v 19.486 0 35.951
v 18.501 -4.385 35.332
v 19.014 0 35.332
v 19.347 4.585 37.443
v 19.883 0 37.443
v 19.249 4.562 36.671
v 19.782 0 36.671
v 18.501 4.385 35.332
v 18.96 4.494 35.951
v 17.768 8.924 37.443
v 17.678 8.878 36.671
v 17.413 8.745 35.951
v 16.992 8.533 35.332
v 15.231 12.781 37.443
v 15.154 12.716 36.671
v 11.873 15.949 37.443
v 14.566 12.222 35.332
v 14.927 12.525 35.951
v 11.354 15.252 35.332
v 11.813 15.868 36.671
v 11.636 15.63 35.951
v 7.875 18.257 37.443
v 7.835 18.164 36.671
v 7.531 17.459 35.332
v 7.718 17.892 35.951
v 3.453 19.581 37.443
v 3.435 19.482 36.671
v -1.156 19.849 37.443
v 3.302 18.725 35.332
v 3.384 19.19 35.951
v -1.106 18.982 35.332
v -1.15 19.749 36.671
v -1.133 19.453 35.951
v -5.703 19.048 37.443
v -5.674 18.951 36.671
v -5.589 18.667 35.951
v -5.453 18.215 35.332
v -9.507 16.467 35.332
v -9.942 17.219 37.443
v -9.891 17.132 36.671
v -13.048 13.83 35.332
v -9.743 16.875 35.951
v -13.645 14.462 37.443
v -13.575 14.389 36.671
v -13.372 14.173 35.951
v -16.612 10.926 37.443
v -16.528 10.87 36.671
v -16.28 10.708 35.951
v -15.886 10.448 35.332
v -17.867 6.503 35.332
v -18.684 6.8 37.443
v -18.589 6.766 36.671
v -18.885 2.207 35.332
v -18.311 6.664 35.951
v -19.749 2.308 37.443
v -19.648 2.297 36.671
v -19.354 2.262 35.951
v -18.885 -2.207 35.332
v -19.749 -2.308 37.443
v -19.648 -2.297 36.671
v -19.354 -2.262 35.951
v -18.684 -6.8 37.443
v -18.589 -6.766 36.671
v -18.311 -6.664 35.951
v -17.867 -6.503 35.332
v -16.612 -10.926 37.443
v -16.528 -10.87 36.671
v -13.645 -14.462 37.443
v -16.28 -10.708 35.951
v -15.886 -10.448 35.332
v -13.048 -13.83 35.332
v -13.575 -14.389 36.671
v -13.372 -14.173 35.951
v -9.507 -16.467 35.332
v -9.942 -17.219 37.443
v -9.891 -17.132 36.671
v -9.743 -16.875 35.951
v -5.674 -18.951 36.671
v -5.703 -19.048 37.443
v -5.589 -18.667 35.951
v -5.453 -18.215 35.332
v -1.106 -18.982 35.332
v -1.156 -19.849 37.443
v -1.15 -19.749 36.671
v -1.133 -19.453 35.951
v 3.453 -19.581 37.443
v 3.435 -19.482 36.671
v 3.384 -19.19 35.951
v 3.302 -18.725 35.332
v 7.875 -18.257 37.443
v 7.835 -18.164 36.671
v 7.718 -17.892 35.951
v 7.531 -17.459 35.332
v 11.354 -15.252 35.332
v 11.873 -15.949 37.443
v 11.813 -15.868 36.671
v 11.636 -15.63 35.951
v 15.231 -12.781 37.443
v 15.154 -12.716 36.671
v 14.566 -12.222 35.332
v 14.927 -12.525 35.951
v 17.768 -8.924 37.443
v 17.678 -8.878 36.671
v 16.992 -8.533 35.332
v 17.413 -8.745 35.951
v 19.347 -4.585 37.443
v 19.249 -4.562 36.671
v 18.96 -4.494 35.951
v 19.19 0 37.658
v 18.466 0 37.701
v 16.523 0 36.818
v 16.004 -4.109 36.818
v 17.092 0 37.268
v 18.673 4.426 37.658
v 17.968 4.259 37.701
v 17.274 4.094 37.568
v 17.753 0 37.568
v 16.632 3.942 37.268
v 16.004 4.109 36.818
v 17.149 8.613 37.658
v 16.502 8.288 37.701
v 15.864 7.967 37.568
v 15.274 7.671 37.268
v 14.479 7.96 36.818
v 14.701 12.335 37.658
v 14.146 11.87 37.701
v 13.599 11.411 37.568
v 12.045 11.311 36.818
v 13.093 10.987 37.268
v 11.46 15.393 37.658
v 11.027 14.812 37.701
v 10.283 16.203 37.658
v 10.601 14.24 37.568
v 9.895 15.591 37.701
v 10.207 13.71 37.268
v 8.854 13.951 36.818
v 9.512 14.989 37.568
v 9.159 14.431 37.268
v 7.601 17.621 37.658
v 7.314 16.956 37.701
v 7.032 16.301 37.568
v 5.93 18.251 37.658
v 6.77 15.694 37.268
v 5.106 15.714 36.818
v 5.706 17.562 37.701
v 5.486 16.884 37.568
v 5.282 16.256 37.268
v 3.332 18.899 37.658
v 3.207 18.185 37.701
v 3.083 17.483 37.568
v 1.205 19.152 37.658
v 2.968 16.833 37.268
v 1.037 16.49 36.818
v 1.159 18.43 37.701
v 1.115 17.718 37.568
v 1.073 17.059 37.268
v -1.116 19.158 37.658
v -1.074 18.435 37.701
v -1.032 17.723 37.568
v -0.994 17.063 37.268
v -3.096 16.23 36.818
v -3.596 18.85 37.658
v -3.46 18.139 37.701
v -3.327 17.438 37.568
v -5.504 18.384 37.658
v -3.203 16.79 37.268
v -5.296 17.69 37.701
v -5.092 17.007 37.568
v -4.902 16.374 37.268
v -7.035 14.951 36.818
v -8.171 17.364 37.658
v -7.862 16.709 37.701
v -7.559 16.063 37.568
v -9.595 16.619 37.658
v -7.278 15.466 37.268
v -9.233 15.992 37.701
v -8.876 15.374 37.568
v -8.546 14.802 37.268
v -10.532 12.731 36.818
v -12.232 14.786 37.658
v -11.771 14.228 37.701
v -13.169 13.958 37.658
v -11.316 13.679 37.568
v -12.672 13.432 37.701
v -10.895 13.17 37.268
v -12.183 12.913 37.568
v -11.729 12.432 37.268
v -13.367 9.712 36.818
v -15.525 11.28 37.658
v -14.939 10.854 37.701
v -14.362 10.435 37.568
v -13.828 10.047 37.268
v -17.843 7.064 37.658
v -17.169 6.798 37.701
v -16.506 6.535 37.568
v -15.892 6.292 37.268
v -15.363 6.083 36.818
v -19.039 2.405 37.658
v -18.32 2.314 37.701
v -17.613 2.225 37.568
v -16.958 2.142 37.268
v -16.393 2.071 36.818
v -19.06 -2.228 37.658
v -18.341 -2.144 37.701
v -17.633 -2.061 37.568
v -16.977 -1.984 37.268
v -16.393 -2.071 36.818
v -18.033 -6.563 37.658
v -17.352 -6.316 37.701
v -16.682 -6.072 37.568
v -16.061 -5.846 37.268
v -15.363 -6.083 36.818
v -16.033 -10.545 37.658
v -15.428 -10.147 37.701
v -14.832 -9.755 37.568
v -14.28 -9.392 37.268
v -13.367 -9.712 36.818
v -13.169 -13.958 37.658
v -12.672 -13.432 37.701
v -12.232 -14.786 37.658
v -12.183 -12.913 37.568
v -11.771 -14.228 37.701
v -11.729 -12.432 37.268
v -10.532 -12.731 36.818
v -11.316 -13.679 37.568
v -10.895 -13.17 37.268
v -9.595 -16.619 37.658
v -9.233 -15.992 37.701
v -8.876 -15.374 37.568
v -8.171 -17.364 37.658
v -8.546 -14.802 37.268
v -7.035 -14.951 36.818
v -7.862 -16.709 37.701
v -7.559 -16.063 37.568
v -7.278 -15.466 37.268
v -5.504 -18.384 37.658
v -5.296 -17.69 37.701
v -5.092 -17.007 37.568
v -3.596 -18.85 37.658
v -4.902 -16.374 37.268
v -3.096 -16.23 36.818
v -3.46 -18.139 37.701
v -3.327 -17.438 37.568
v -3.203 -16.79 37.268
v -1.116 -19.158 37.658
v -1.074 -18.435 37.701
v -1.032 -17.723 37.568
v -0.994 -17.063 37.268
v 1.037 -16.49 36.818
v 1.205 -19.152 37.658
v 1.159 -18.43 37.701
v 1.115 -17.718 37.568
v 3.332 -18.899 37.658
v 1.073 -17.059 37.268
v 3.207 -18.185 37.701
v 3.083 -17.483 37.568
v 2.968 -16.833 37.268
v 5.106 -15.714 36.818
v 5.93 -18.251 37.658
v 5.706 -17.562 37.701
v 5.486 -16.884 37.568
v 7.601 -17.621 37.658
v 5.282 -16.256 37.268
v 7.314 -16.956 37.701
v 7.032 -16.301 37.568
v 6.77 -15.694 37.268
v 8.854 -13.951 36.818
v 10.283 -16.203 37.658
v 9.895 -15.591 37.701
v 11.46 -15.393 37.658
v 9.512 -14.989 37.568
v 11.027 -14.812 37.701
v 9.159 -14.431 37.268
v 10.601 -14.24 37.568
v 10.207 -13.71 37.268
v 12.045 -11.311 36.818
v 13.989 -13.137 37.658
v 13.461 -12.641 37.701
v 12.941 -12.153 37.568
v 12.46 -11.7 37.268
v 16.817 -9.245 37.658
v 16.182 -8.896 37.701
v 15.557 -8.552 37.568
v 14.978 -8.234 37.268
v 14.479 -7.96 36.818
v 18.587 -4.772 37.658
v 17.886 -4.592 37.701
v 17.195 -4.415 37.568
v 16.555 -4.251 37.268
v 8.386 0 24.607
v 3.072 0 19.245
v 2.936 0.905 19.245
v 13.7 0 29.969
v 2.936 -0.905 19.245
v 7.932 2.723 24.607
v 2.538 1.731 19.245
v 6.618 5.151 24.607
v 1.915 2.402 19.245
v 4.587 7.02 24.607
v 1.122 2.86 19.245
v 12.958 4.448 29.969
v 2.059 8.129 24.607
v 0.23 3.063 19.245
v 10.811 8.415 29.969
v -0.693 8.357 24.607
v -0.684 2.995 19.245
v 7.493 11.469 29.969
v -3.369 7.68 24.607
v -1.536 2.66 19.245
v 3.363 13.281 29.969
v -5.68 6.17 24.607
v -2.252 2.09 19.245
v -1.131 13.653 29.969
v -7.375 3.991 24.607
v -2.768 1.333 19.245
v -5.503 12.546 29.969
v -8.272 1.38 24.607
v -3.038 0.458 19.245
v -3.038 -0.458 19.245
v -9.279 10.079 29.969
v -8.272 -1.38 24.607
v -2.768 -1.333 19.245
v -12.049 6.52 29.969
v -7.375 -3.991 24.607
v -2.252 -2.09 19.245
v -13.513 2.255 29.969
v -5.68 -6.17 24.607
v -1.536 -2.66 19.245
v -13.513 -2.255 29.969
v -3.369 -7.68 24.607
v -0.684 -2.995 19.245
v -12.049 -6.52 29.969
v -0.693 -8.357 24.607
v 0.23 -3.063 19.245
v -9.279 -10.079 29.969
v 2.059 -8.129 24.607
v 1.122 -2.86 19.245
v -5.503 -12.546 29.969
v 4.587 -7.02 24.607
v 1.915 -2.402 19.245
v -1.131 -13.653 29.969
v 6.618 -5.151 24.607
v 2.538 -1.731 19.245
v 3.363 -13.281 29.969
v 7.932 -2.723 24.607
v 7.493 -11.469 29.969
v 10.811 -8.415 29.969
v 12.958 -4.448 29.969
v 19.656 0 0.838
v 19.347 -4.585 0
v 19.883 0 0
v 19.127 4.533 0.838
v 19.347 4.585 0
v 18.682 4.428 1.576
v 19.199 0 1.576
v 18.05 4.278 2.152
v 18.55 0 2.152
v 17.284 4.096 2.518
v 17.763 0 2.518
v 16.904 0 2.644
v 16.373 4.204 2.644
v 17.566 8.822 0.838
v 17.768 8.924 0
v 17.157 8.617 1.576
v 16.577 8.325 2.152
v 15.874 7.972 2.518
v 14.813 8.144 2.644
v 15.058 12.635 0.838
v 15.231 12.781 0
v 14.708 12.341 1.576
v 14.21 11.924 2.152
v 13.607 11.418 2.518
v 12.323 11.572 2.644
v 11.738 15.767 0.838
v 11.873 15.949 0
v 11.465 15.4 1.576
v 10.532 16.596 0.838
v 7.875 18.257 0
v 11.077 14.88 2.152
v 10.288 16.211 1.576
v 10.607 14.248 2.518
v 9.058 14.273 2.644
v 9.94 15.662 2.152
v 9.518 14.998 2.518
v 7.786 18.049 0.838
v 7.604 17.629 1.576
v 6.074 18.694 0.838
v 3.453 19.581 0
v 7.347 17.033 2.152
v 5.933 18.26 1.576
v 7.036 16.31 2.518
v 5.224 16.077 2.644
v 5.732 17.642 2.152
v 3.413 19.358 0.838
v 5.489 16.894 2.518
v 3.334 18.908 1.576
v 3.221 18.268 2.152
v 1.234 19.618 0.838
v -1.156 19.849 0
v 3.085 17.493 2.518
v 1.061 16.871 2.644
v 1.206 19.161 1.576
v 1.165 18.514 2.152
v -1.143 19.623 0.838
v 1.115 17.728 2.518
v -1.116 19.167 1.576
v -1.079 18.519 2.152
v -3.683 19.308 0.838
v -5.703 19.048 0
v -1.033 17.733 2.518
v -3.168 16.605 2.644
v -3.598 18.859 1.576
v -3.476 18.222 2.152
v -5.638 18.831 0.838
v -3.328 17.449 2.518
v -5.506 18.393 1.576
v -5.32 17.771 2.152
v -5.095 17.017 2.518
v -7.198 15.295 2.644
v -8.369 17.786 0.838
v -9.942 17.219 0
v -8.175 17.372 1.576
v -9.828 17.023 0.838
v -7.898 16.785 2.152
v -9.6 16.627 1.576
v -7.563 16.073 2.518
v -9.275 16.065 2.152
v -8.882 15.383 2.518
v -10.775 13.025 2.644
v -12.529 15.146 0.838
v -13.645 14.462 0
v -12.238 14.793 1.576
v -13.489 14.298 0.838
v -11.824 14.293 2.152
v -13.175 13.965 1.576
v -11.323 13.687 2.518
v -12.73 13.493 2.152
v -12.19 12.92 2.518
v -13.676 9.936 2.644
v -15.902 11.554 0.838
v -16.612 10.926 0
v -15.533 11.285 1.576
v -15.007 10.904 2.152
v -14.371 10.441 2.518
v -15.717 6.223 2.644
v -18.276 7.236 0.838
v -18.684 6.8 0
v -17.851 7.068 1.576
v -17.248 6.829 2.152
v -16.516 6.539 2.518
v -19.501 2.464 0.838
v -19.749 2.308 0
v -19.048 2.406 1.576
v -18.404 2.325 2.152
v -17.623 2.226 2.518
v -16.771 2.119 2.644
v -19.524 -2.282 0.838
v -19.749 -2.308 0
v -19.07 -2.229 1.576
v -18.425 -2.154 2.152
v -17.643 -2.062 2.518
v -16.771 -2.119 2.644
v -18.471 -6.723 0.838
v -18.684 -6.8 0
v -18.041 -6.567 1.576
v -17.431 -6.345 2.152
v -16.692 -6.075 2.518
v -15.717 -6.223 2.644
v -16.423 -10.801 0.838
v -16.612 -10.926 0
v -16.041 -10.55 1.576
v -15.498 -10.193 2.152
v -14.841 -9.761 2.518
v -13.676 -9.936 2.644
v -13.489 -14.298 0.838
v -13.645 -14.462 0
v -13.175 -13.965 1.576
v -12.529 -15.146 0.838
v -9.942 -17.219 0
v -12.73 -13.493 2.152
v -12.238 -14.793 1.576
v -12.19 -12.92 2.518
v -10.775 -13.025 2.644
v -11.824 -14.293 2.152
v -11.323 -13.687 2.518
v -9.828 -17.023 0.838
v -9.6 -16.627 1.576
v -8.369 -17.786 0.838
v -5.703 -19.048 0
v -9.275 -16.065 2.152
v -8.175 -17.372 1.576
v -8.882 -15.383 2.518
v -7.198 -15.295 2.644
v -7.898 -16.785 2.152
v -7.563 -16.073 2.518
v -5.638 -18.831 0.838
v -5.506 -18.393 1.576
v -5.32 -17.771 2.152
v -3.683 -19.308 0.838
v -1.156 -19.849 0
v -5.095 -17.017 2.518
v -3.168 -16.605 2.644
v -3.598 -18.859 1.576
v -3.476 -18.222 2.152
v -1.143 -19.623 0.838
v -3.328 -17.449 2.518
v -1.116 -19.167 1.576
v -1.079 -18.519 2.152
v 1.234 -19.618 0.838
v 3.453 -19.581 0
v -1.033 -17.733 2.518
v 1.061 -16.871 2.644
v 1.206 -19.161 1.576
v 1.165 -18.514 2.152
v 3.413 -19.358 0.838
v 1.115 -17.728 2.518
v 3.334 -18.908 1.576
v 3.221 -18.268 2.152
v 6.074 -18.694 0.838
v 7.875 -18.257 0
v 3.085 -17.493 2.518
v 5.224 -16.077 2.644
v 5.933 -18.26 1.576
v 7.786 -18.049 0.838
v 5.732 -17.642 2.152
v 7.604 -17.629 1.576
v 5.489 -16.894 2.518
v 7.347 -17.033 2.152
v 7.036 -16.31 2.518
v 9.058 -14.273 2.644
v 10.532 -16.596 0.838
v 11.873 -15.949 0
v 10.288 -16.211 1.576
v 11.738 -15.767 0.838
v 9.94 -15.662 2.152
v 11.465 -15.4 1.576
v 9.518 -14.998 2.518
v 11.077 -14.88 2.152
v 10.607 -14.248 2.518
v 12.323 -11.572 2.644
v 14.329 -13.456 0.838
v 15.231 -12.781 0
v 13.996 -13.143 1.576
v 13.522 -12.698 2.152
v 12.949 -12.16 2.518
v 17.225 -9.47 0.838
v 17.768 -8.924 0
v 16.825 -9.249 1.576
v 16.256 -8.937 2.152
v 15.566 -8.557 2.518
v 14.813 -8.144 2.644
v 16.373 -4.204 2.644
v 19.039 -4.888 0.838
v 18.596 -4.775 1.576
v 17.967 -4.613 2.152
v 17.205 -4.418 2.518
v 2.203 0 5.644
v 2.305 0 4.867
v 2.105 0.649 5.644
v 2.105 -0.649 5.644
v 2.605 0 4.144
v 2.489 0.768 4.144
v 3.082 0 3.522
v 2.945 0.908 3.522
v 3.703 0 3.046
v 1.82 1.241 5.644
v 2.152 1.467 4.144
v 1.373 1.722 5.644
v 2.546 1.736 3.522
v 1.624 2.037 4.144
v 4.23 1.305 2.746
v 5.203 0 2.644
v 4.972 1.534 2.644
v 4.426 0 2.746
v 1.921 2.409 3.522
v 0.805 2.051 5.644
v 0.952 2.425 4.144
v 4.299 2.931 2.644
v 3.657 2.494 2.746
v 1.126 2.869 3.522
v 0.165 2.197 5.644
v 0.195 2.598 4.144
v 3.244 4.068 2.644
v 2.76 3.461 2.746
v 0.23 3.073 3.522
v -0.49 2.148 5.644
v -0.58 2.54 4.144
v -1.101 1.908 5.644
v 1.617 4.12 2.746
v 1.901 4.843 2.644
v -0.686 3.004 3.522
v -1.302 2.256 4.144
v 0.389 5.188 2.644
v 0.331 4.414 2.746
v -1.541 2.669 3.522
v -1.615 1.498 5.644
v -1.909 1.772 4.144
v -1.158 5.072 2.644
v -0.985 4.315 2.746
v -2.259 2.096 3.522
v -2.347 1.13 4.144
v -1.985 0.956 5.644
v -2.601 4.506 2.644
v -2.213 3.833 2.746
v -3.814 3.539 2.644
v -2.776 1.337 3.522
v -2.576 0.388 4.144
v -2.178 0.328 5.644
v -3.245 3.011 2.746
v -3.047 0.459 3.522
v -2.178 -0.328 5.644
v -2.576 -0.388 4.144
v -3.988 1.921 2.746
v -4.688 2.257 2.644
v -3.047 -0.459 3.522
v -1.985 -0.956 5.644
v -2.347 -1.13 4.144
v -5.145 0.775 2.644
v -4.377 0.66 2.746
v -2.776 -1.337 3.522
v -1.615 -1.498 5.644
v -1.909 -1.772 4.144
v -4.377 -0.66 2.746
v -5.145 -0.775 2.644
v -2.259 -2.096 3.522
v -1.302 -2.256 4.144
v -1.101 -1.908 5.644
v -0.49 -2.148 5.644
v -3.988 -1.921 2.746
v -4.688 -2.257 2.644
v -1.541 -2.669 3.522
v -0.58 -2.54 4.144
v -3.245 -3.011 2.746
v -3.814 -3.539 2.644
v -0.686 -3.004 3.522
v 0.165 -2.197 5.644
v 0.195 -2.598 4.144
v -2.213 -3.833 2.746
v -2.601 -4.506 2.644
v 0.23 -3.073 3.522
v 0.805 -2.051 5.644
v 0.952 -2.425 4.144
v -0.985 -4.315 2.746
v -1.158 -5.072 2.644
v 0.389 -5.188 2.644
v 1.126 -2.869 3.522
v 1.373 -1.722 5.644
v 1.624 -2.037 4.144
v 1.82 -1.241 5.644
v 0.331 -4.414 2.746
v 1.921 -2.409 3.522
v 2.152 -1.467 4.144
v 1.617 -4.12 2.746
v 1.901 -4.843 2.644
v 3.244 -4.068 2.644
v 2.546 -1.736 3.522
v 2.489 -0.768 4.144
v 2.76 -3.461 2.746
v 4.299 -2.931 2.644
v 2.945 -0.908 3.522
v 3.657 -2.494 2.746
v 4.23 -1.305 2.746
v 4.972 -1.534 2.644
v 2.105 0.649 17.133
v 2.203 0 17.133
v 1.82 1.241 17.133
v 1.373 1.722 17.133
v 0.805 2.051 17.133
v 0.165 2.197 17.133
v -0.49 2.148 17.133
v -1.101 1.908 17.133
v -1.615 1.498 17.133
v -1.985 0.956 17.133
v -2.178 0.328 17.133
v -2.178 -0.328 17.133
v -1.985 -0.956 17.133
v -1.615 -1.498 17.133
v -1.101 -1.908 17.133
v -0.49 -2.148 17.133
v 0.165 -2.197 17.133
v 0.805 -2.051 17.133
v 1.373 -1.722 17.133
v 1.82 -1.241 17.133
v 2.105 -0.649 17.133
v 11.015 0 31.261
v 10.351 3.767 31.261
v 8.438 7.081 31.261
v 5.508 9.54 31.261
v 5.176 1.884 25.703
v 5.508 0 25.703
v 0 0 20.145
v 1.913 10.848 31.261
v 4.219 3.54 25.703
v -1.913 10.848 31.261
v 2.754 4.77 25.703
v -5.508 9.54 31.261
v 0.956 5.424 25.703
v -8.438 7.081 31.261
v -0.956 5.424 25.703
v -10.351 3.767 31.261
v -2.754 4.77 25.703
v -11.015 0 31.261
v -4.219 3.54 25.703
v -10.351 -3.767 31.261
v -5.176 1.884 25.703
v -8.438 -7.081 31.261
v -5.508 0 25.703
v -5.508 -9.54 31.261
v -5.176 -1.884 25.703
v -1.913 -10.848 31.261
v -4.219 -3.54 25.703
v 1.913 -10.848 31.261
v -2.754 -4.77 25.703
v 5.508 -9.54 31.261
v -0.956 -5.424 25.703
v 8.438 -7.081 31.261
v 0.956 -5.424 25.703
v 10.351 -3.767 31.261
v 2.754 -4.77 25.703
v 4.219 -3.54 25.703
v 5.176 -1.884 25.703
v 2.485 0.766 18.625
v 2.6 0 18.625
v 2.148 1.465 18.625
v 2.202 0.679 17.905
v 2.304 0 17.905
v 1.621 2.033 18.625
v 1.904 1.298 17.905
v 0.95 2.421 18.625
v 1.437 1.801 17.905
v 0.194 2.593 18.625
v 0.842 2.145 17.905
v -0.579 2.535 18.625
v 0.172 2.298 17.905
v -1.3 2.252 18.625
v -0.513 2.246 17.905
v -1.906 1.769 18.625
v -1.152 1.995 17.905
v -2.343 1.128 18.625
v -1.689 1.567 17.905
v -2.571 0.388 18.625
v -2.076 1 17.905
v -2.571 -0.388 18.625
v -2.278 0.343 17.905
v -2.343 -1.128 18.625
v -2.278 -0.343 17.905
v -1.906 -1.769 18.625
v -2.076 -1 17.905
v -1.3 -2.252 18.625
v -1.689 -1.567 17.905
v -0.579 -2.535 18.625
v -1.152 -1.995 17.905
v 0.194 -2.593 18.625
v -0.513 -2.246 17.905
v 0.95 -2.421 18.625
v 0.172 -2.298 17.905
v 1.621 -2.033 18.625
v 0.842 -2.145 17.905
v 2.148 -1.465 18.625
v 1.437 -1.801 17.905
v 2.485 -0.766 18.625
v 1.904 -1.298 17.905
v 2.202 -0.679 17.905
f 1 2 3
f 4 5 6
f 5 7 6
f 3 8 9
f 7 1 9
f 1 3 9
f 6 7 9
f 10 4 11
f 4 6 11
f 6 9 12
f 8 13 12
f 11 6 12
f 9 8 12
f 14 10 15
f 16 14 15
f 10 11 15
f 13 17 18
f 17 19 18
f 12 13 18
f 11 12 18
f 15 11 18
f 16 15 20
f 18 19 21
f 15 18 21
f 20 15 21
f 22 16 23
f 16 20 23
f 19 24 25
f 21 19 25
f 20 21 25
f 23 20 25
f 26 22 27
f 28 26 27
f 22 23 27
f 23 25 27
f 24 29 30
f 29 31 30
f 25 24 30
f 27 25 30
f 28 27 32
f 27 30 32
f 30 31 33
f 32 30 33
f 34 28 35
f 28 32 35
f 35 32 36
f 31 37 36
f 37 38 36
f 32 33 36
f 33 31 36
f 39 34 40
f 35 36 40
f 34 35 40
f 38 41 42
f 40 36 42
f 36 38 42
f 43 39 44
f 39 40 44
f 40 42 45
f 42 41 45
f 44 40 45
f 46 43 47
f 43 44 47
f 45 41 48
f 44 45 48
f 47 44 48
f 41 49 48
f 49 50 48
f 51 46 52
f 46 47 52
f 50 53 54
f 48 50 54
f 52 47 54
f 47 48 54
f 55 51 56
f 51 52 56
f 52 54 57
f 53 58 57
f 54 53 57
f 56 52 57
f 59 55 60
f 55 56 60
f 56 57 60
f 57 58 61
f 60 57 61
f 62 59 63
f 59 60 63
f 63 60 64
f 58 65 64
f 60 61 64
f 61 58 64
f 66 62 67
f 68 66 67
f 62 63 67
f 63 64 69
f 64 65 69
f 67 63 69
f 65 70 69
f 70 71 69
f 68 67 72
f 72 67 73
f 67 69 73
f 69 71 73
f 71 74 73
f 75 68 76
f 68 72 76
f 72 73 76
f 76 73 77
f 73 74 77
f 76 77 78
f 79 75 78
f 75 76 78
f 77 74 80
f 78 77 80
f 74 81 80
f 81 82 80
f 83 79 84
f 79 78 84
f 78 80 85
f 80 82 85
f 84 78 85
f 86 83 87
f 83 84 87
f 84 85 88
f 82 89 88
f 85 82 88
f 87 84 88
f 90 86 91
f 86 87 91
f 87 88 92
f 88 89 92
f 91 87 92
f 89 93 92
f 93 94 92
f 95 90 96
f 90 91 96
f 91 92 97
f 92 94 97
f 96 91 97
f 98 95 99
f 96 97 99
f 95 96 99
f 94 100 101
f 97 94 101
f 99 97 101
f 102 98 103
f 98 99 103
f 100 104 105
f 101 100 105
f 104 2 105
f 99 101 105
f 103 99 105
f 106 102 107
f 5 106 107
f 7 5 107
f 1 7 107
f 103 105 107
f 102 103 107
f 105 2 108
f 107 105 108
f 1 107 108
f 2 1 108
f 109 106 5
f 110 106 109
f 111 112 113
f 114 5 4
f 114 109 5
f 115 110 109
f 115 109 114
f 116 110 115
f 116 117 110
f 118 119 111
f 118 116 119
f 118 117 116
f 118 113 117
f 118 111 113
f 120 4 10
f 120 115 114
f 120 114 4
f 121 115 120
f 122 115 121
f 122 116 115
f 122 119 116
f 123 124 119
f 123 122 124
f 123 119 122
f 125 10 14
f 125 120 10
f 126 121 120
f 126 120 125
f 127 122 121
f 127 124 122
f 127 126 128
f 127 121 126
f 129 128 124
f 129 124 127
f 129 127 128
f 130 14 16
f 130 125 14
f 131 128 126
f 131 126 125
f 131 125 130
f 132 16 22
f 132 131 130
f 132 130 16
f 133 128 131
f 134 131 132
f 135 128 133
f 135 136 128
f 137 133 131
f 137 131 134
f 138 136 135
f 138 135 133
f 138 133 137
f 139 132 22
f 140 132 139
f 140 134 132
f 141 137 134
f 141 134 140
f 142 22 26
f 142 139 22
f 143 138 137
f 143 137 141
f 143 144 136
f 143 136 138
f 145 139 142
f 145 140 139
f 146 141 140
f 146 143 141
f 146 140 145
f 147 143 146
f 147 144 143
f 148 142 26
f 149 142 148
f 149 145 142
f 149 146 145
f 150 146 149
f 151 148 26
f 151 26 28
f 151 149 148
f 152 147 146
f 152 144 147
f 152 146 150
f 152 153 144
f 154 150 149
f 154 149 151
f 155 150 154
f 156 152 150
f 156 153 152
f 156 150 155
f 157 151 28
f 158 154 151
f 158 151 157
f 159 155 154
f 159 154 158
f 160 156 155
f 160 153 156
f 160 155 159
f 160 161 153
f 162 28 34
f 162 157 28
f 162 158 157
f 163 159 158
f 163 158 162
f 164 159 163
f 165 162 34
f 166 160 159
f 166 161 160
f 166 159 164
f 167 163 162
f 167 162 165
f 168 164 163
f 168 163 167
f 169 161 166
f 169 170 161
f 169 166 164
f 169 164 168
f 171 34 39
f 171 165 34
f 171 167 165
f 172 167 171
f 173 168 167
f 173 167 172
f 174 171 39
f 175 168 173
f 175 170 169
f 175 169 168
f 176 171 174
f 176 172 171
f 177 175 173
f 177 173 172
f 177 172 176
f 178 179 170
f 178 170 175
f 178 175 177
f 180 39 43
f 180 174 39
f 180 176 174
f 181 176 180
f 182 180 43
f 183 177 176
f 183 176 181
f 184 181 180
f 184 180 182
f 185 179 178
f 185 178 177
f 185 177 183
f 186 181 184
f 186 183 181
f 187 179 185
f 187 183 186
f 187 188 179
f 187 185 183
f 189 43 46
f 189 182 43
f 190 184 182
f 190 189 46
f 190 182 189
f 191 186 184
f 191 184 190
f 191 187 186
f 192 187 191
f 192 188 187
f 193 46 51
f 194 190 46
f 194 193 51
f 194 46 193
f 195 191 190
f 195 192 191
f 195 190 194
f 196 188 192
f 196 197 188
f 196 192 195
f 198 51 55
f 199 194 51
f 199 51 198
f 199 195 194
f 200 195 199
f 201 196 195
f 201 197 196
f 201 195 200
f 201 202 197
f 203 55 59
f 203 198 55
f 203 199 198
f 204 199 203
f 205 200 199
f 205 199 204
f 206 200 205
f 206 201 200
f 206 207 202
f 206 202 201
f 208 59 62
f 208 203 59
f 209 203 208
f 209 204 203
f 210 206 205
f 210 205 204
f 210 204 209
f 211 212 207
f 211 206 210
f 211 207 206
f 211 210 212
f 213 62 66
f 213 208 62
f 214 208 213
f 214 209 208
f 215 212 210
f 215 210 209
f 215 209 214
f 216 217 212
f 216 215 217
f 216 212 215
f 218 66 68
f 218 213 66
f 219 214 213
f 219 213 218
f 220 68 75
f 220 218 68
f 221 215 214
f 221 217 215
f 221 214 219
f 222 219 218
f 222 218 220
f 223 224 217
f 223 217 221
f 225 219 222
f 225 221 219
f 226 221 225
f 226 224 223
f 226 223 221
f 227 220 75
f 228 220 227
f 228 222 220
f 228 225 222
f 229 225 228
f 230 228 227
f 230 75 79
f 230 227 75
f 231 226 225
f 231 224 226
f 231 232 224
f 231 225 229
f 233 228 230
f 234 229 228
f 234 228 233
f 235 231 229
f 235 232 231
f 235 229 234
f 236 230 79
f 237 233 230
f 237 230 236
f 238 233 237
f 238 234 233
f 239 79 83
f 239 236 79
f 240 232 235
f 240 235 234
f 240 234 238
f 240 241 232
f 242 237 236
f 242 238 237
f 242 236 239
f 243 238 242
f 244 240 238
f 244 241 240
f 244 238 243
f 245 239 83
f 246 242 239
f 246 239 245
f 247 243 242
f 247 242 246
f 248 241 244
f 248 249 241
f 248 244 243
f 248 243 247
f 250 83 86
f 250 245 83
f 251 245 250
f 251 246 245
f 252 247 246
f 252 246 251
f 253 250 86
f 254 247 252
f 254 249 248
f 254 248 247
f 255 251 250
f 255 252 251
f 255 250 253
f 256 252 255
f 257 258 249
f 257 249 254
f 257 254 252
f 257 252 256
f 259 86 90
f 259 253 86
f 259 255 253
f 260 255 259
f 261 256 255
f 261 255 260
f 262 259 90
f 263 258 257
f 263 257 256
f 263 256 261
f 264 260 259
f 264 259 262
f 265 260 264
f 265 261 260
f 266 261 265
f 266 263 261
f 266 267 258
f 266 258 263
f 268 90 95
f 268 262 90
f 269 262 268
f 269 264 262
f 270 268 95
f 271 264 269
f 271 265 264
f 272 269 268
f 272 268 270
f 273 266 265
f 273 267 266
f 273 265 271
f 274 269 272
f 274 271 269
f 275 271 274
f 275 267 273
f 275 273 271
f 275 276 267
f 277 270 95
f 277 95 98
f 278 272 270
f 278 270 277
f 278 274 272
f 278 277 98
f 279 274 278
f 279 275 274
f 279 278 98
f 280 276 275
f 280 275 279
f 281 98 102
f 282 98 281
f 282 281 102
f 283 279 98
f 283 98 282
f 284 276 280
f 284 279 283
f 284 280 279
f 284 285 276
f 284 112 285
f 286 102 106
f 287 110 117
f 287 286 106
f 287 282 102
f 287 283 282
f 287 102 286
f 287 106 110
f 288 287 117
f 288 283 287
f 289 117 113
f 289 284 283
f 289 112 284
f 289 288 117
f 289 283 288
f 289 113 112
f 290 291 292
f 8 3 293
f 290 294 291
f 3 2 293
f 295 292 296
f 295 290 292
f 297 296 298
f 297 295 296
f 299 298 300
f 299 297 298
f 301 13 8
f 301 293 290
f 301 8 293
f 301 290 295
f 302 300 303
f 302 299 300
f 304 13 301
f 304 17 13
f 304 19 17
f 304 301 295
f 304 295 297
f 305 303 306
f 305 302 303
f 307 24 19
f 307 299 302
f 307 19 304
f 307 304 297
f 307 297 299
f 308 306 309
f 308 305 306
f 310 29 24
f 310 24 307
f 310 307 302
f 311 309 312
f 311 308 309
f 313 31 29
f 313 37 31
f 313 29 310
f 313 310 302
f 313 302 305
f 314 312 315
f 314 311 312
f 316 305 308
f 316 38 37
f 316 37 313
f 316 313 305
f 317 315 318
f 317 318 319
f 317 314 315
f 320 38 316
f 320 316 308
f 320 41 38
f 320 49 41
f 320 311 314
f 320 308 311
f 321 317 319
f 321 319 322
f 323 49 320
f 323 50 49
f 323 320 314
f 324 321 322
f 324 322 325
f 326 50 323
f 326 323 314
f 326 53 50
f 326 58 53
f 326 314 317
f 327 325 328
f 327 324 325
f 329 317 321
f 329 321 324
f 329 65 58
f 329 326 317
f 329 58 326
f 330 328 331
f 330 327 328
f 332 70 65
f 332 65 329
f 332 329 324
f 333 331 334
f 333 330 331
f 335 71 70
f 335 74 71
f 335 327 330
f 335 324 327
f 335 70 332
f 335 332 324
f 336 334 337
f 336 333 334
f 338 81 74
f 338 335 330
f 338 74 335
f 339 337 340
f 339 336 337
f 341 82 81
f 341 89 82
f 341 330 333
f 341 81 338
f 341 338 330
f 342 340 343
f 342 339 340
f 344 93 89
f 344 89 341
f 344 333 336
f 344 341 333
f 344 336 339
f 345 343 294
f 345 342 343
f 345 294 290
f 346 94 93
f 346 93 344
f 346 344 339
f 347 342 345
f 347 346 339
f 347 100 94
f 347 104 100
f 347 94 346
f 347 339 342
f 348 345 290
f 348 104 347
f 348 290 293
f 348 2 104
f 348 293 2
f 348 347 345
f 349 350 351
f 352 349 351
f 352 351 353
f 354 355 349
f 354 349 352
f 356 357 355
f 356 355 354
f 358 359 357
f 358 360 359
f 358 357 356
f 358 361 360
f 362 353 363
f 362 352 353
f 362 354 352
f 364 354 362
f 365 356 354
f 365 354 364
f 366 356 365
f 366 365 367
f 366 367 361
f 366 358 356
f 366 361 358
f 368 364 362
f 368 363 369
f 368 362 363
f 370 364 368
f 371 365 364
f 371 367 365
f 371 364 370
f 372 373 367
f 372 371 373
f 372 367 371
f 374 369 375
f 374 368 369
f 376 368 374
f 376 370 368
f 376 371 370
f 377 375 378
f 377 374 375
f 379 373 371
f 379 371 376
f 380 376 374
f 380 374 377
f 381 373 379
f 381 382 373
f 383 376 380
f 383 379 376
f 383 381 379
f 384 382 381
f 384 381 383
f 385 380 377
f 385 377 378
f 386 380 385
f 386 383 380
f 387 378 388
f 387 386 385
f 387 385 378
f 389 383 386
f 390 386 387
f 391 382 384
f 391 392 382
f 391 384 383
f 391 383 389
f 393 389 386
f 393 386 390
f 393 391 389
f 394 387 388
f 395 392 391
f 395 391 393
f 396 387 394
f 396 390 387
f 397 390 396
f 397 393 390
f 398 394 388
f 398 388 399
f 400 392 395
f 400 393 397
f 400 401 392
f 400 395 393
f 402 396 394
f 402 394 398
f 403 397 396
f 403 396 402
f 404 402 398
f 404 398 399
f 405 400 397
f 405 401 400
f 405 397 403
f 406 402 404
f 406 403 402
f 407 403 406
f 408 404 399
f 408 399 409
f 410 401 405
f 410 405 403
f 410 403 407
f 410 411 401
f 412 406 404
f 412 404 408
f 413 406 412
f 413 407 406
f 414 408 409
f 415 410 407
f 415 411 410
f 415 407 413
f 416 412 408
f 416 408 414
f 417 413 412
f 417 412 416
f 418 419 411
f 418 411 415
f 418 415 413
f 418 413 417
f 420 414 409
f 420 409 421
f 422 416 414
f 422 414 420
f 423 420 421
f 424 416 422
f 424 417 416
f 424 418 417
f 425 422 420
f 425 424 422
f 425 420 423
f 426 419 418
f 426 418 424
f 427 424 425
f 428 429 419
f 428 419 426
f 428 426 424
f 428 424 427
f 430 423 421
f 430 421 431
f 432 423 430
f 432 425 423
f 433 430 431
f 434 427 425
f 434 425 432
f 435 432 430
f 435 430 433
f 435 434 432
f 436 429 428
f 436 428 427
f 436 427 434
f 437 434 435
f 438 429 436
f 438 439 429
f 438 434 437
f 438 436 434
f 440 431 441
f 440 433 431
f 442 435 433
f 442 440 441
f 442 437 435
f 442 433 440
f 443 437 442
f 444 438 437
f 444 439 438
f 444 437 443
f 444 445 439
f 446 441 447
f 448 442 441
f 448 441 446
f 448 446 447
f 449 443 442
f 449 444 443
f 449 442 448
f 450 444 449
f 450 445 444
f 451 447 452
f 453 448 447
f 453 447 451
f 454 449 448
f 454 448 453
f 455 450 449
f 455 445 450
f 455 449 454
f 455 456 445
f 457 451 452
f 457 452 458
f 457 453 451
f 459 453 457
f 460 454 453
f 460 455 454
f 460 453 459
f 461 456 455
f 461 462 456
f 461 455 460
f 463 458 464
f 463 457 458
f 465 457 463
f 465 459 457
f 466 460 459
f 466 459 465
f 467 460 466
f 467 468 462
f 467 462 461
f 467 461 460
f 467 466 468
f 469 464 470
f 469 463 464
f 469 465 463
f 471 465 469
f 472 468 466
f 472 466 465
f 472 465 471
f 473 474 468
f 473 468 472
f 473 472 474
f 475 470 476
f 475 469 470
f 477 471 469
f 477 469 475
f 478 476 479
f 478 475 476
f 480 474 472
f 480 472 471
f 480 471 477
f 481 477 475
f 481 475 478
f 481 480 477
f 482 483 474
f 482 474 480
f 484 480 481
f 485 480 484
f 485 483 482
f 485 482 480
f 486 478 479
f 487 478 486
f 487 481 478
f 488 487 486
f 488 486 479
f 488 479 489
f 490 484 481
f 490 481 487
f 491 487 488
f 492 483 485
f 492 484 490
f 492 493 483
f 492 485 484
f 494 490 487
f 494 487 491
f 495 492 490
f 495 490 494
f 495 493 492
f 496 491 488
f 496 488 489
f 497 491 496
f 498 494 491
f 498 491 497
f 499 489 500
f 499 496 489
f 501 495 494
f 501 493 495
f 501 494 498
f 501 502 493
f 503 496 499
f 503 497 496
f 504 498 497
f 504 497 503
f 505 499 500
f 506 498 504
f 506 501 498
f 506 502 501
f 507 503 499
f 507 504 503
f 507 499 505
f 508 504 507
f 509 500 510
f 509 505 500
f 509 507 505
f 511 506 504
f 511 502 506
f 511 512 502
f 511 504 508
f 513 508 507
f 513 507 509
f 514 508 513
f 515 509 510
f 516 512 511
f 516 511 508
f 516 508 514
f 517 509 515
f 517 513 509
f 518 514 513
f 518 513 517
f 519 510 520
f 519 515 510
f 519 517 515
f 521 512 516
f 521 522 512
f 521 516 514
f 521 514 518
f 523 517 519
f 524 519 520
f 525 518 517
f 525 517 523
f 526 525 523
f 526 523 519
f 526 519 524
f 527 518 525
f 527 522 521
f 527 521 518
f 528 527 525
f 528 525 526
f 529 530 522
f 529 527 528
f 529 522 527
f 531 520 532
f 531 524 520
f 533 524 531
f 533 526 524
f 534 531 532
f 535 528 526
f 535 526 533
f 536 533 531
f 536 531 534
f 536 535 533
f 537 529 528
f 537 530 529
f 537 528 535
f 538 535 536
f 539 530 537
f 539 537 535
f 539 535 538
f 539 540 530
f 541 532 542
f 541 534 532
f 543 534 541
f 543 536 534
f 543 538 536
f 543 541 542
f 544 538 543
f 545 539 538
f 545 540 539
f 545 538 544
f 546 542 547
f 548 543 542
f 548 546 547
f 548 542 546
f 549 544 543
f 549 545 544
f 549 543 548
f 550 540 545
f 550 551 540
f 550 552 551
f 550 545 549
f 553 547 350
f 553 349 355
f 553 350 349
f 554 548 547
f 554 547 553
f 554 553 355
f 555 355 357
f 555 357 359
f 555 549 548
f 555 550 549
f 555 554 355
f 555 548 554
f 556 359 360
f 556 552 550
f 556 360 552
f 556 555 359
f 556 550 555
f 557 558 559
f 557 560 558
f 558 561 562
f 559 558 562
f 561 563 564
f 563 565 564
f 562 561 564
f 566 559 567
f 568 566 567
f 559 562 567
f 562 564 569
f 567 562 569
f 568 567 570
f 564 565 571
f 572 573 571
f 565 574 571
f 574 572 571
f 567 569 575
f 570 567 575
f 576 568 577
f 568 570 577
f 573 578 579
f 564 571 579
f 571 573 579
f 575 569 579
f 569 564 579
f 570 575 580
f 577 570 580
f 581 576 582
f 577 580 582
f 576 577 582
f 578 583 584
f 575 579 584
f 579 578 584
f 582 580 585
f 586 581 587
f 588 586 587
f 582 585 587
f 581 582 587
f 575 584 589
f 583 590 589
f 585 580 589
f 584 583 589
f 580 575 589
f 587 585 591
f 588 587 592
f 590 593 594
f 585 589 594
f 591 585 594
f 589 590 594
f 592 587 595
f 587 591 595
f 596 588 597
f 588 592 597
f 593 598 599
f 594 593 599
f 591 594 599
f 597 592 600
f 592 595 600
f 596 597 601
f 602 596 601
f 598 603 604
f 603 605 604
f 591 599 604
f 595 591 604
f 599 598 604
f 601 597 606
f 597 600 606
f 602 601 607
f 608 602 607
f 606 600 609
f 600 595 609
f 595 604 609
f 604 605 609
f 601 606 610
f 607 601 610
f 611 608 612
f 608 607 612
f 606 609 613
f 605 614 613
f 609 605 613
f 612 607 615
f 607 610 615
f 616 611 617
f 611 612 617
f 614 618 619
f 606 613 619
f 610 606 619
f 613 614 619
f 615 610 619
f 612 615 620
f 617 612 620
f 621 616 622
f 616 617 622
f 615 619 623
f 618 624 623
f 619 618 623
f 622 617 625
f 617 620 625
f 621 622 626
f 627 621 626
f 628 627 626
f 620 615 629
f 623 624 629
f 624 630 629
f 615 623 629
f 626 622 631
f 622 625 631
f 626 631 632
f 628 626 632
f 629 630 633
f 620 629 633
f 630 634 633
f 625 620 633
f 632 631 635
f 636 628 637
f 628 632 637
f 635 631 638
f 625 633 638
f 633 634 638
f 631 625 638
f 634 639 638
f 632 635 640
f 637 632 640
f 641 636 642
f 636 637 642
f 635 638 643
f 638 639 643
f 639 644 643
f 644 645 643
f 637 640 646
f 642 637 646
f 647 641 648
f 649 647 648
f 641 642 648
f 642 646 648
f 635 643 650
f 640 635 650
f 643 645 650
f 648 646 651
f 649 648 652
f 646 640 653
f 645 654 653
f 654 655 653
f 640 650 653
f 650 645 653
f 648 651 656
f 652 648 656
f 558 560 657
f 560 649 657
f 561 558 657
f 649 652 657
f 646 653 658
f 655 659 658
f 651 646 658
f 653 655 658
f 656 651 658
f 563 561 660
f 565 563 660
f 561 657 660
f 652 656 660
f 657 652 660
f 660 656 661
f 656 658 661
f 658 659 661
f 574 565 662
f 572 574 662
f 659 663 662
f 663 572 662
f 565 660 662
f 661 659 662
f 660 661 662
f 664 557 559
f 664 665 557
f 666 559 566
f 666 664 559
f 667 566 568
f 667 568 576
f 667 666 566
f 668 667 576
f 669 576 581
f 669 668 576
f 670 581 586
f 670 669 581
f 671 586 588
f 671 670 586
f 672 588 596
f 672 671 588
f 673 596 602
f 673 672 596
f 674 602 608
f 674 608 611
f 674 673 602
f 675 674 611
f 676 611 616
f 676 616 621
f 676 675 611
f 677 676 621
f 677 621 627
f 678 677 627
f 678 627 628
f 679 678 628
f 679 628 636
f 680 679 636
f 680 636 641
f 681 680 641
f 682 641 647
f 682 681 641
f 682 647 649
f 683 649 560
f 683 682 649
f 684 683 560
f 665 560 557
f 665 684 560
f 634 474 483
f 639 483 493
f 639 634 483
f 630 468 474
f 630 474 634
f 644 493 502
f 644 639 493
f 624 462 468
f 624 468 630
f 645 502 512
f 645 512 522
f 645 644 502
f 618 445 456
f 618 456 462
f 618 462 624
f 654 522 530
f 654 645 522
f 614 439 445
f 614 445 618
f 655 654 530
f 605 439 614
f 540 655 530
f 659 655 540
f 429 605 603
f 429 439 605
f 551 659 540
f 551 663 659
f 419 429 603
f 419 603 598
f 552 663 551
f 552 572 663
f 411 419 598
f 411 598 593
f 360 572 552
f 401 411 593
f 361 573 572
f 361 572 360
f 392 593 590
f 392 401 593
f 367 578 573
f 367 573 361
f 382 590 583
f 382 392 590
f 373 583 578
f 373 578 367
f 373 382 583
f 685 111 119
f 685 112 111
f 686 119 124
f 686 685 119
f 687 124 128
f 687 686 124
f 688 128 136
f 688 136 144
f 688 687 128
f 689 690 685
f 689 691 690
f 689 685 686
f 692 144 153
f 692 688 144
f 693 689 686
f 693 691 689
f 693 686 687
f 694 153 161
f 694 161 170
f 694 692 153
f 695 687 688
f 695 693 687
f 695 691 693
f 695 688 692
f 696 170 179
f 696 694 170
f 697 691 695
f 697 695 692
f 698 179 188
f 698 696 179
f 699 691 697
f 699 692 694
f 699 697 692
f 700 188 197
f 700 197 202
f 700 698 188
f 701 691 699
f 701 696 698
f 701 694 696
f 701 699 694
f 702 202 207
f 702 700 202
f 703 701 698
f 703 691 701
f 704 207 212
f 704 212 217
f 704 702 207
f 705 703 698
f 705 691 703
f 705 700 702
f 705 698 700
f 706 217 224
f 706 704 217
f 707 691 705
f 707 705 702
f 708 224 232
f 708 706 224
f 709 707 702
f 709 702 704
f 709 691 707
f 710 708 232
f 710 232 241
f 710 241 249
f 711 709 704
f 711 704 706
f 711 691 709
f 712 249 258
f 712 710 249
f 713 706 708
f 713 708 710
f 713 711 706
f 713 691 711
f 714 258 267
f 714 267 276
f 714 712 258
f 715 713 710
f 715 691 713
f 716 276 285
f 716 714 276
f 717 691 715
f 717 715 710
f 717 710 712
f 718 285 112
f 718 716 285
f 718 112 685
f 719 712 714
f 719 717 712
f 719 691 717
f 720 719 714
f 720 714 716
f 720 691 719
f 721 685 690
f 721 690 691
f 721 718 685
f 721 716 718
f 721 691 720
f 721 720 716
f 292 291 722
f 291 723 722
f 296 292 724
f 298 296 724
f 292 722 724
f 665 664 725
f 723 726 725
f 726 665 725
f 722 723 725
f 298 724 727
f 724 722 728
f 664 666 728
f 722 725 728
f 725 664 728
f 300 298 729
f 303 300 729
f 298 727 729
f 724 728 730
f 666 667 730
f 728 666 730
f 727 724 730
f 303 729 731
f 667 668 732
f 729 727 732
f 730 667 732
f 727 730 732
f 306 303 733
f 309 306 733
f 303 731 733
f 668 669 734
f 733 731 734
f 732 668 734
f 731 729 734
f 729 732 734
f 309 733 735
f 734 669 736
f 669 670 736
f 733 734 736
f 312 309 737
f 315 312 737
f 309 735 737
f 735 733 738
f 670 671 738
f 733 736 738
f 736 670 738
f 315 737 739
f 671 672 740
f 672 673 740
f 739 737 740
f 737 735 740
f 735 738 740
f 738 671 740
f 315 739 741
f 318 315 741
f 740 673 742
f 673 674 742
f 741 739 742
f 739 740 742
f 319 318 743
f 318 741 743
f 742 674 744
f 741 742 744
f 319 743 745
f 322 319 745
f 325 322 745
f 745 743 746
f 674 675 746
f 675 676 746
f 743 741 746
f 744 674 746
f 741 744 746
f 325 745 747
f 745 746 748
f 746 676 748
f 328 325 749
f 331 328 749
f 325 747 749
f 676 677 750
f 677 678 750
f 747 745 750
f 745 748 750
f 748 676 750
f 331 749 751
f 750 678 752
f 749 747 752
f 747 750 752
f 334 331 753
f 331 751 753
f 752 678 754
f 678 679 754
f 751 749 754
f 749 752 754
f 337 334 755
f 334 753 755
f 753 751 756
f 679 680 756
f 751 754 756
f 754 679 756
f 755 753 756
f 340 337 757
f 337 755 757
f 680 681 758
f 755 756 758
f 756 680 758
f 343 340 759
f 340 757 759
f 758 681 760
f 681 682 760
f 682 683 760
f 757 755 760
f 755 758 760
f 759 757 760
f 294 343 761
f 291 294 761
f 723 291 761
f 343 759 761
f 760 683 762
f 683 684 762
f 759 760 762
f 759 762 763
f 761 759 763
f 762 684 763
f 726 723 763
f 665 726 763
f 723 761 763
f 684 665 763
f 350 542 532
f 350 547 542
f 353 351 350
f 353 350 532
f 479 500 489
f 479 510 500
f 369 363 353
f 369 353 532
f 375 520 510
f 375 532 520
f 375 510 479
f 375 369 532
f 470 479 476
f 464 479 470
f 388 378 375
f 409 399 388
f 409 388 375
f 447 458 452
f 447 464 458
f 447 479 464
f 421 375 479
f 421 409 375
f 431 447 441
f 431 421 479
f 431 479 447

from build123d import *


# Not quite as in the source:
# - a fillet or chamfer that OpenCascade refuses, or shapes differently, is made with other operations: its cross-section is extruded or revolved along the edge and cut away or added


with BuildPart() as f1:
    # F0 (on Front) → F1 (revolve)
    with BuildSketch(Plane.XZ):
        Polygon((0, 20.1451450631), (0, 16.144845517), (2.2029185202, 18.3677908103), (19.8830971494, 36.208700271), (19.8830971494, 40.2089998171), align=None)
        Polygon((0, 2.6437440974), (0, 0), (19.8830971494, 0), (19.8830971494, 2.6437440974), (2.2029185202, 2.6437440974), align=None)
        Polygon((0, 16.144845517), (0, 2.6437440974), (2.2029185202, 2.6437440974), (2.2029185202, 18.3677908103), align=None)
    revolve(axis=Axis((0, 0, 11.3944445803), (0, 0, 1)))

    # F2: fillet of radius 3 on 3 edges, made by hand

    # F2_s1 → F2_t2 (revolve, cut)
    with BuildSketch(Plane.XZ):
        with BuildLine():
            ThreePointArc((19.8830971494, 37.4433964965), (19.6573260634, 36.3016198402), (19.0139945276, 35.331696621))
            Line((19.0139945276, 35.331696621), (19.0566124751, 35.2894626235))
            Line((19.0566124751, 35.2894626235), (19.9430971494, 36.1840063464))
            Line((19.9430971494, 36.1840063464), (19.9430971494, 37.4433964965))
            Line((19.9430971494, 37.4433964965), (19.8830971494, 37.4433964965))
        make_face()
    revolve(axis=Axis((0, 0, 36.208700271), (0, 0, 1)), mode=Mode.SUBTRACT)

    # F2_s3 → F2_t4 (revolve, cut)
    with BuildSketch(Plane.XZ):
        with BuildLine():
            ThreePointArc((19.8830971494, 0), (18.8957107839, 1.8874873657), (16.9043252998, 2.6437440974))
            Line((16.9043252998, 2.6437440974), (16.9043252998, 2.7037440974))
            Line((16.9043252998, 2.7037440974), (19.8830971494, 2.7037440974))
            Line((19.8830971494, 2.7037440974), (19.9430971494, 2.6437440974))
            ThreePointArc((19.9430971494, 2.6437440974), (19.9430971494, 1.3218720487), (19.9426725864, 0.0071251181))
            Line((19.9426725864, 0.0071251181), (19.8830971494, 0))
        make_face()
    revolve(axis=Axis((0, 0, 2.6437440974), (0, 0, 1)), mode=Mode.SUBTRACT)

    # F2_s5 → F2_t6 (revolve)
    with BuildSketch(Plane.XZ):
        with BuildLine():
            ThreePointArc((3.0720211421, 19.2447944602), (2.4286896062, 18.274871241), (2.2029185202, 17.1330945847))
            Line((2.2029185202, 17.1330945847), (2.1429185202, 17.1330945847))
            Line((2.1429185202, 17.1330945847), (2.1429185202, 18.3924847348))
            Line((2.1429185202, 18.3924847348), (3.0294031945, 19.2870284577))
            Line((3.0294031945, 19.2870284577), (3.0720211421, 19.2447944602))
        make_face()
    revolve(axis=Axis((0, 0, 18.3677908103), (0, 0, 1)))

    # F3: fillet of radius 3 on 2 edges, made by hand

    # F3_s1 → F3_t2 (revolve)
    with BuildSketch(Plane.XZ):
        with BuildLine():
            ThreePointArc((2.2029185202, 5.6437440974), (3.0815981766, 3.5224237539), (5.2029185202, 2.6437440974))
            Line((5.2029185202, 2.6437440974), (2.2029185202, 2.6437440974))
            Line((2.2029185202, 2.6437440974), (2.2029185202, 5.6437440974))
        make_face()
    revolve(axis=Axis((0, 0, 2.6437440974), (0, 0, 1)))

    # F3_s3 → F3_t4 (revolve, cut)
    with BuildSketch(Plane.XZ):
        with BuildLine():
            ThreePointArc((19.8830971494, 37.4433827054), (18.1053935902, 37.6561495071), (16.5230757584, 36.8184324094))
            Line((16.5230757584, 36.8184324094), (19.8830971494, 40.2089998171))
            Line((19.8830971494, 40.2089998171), (19.8830971494, 37.4433827054))
        make_face()
    revolve(axis=Axis((0, 0, 40.2089998171), (0, 0, 1)), mode=Mode.SUBTRACT)


solid = f1.part
